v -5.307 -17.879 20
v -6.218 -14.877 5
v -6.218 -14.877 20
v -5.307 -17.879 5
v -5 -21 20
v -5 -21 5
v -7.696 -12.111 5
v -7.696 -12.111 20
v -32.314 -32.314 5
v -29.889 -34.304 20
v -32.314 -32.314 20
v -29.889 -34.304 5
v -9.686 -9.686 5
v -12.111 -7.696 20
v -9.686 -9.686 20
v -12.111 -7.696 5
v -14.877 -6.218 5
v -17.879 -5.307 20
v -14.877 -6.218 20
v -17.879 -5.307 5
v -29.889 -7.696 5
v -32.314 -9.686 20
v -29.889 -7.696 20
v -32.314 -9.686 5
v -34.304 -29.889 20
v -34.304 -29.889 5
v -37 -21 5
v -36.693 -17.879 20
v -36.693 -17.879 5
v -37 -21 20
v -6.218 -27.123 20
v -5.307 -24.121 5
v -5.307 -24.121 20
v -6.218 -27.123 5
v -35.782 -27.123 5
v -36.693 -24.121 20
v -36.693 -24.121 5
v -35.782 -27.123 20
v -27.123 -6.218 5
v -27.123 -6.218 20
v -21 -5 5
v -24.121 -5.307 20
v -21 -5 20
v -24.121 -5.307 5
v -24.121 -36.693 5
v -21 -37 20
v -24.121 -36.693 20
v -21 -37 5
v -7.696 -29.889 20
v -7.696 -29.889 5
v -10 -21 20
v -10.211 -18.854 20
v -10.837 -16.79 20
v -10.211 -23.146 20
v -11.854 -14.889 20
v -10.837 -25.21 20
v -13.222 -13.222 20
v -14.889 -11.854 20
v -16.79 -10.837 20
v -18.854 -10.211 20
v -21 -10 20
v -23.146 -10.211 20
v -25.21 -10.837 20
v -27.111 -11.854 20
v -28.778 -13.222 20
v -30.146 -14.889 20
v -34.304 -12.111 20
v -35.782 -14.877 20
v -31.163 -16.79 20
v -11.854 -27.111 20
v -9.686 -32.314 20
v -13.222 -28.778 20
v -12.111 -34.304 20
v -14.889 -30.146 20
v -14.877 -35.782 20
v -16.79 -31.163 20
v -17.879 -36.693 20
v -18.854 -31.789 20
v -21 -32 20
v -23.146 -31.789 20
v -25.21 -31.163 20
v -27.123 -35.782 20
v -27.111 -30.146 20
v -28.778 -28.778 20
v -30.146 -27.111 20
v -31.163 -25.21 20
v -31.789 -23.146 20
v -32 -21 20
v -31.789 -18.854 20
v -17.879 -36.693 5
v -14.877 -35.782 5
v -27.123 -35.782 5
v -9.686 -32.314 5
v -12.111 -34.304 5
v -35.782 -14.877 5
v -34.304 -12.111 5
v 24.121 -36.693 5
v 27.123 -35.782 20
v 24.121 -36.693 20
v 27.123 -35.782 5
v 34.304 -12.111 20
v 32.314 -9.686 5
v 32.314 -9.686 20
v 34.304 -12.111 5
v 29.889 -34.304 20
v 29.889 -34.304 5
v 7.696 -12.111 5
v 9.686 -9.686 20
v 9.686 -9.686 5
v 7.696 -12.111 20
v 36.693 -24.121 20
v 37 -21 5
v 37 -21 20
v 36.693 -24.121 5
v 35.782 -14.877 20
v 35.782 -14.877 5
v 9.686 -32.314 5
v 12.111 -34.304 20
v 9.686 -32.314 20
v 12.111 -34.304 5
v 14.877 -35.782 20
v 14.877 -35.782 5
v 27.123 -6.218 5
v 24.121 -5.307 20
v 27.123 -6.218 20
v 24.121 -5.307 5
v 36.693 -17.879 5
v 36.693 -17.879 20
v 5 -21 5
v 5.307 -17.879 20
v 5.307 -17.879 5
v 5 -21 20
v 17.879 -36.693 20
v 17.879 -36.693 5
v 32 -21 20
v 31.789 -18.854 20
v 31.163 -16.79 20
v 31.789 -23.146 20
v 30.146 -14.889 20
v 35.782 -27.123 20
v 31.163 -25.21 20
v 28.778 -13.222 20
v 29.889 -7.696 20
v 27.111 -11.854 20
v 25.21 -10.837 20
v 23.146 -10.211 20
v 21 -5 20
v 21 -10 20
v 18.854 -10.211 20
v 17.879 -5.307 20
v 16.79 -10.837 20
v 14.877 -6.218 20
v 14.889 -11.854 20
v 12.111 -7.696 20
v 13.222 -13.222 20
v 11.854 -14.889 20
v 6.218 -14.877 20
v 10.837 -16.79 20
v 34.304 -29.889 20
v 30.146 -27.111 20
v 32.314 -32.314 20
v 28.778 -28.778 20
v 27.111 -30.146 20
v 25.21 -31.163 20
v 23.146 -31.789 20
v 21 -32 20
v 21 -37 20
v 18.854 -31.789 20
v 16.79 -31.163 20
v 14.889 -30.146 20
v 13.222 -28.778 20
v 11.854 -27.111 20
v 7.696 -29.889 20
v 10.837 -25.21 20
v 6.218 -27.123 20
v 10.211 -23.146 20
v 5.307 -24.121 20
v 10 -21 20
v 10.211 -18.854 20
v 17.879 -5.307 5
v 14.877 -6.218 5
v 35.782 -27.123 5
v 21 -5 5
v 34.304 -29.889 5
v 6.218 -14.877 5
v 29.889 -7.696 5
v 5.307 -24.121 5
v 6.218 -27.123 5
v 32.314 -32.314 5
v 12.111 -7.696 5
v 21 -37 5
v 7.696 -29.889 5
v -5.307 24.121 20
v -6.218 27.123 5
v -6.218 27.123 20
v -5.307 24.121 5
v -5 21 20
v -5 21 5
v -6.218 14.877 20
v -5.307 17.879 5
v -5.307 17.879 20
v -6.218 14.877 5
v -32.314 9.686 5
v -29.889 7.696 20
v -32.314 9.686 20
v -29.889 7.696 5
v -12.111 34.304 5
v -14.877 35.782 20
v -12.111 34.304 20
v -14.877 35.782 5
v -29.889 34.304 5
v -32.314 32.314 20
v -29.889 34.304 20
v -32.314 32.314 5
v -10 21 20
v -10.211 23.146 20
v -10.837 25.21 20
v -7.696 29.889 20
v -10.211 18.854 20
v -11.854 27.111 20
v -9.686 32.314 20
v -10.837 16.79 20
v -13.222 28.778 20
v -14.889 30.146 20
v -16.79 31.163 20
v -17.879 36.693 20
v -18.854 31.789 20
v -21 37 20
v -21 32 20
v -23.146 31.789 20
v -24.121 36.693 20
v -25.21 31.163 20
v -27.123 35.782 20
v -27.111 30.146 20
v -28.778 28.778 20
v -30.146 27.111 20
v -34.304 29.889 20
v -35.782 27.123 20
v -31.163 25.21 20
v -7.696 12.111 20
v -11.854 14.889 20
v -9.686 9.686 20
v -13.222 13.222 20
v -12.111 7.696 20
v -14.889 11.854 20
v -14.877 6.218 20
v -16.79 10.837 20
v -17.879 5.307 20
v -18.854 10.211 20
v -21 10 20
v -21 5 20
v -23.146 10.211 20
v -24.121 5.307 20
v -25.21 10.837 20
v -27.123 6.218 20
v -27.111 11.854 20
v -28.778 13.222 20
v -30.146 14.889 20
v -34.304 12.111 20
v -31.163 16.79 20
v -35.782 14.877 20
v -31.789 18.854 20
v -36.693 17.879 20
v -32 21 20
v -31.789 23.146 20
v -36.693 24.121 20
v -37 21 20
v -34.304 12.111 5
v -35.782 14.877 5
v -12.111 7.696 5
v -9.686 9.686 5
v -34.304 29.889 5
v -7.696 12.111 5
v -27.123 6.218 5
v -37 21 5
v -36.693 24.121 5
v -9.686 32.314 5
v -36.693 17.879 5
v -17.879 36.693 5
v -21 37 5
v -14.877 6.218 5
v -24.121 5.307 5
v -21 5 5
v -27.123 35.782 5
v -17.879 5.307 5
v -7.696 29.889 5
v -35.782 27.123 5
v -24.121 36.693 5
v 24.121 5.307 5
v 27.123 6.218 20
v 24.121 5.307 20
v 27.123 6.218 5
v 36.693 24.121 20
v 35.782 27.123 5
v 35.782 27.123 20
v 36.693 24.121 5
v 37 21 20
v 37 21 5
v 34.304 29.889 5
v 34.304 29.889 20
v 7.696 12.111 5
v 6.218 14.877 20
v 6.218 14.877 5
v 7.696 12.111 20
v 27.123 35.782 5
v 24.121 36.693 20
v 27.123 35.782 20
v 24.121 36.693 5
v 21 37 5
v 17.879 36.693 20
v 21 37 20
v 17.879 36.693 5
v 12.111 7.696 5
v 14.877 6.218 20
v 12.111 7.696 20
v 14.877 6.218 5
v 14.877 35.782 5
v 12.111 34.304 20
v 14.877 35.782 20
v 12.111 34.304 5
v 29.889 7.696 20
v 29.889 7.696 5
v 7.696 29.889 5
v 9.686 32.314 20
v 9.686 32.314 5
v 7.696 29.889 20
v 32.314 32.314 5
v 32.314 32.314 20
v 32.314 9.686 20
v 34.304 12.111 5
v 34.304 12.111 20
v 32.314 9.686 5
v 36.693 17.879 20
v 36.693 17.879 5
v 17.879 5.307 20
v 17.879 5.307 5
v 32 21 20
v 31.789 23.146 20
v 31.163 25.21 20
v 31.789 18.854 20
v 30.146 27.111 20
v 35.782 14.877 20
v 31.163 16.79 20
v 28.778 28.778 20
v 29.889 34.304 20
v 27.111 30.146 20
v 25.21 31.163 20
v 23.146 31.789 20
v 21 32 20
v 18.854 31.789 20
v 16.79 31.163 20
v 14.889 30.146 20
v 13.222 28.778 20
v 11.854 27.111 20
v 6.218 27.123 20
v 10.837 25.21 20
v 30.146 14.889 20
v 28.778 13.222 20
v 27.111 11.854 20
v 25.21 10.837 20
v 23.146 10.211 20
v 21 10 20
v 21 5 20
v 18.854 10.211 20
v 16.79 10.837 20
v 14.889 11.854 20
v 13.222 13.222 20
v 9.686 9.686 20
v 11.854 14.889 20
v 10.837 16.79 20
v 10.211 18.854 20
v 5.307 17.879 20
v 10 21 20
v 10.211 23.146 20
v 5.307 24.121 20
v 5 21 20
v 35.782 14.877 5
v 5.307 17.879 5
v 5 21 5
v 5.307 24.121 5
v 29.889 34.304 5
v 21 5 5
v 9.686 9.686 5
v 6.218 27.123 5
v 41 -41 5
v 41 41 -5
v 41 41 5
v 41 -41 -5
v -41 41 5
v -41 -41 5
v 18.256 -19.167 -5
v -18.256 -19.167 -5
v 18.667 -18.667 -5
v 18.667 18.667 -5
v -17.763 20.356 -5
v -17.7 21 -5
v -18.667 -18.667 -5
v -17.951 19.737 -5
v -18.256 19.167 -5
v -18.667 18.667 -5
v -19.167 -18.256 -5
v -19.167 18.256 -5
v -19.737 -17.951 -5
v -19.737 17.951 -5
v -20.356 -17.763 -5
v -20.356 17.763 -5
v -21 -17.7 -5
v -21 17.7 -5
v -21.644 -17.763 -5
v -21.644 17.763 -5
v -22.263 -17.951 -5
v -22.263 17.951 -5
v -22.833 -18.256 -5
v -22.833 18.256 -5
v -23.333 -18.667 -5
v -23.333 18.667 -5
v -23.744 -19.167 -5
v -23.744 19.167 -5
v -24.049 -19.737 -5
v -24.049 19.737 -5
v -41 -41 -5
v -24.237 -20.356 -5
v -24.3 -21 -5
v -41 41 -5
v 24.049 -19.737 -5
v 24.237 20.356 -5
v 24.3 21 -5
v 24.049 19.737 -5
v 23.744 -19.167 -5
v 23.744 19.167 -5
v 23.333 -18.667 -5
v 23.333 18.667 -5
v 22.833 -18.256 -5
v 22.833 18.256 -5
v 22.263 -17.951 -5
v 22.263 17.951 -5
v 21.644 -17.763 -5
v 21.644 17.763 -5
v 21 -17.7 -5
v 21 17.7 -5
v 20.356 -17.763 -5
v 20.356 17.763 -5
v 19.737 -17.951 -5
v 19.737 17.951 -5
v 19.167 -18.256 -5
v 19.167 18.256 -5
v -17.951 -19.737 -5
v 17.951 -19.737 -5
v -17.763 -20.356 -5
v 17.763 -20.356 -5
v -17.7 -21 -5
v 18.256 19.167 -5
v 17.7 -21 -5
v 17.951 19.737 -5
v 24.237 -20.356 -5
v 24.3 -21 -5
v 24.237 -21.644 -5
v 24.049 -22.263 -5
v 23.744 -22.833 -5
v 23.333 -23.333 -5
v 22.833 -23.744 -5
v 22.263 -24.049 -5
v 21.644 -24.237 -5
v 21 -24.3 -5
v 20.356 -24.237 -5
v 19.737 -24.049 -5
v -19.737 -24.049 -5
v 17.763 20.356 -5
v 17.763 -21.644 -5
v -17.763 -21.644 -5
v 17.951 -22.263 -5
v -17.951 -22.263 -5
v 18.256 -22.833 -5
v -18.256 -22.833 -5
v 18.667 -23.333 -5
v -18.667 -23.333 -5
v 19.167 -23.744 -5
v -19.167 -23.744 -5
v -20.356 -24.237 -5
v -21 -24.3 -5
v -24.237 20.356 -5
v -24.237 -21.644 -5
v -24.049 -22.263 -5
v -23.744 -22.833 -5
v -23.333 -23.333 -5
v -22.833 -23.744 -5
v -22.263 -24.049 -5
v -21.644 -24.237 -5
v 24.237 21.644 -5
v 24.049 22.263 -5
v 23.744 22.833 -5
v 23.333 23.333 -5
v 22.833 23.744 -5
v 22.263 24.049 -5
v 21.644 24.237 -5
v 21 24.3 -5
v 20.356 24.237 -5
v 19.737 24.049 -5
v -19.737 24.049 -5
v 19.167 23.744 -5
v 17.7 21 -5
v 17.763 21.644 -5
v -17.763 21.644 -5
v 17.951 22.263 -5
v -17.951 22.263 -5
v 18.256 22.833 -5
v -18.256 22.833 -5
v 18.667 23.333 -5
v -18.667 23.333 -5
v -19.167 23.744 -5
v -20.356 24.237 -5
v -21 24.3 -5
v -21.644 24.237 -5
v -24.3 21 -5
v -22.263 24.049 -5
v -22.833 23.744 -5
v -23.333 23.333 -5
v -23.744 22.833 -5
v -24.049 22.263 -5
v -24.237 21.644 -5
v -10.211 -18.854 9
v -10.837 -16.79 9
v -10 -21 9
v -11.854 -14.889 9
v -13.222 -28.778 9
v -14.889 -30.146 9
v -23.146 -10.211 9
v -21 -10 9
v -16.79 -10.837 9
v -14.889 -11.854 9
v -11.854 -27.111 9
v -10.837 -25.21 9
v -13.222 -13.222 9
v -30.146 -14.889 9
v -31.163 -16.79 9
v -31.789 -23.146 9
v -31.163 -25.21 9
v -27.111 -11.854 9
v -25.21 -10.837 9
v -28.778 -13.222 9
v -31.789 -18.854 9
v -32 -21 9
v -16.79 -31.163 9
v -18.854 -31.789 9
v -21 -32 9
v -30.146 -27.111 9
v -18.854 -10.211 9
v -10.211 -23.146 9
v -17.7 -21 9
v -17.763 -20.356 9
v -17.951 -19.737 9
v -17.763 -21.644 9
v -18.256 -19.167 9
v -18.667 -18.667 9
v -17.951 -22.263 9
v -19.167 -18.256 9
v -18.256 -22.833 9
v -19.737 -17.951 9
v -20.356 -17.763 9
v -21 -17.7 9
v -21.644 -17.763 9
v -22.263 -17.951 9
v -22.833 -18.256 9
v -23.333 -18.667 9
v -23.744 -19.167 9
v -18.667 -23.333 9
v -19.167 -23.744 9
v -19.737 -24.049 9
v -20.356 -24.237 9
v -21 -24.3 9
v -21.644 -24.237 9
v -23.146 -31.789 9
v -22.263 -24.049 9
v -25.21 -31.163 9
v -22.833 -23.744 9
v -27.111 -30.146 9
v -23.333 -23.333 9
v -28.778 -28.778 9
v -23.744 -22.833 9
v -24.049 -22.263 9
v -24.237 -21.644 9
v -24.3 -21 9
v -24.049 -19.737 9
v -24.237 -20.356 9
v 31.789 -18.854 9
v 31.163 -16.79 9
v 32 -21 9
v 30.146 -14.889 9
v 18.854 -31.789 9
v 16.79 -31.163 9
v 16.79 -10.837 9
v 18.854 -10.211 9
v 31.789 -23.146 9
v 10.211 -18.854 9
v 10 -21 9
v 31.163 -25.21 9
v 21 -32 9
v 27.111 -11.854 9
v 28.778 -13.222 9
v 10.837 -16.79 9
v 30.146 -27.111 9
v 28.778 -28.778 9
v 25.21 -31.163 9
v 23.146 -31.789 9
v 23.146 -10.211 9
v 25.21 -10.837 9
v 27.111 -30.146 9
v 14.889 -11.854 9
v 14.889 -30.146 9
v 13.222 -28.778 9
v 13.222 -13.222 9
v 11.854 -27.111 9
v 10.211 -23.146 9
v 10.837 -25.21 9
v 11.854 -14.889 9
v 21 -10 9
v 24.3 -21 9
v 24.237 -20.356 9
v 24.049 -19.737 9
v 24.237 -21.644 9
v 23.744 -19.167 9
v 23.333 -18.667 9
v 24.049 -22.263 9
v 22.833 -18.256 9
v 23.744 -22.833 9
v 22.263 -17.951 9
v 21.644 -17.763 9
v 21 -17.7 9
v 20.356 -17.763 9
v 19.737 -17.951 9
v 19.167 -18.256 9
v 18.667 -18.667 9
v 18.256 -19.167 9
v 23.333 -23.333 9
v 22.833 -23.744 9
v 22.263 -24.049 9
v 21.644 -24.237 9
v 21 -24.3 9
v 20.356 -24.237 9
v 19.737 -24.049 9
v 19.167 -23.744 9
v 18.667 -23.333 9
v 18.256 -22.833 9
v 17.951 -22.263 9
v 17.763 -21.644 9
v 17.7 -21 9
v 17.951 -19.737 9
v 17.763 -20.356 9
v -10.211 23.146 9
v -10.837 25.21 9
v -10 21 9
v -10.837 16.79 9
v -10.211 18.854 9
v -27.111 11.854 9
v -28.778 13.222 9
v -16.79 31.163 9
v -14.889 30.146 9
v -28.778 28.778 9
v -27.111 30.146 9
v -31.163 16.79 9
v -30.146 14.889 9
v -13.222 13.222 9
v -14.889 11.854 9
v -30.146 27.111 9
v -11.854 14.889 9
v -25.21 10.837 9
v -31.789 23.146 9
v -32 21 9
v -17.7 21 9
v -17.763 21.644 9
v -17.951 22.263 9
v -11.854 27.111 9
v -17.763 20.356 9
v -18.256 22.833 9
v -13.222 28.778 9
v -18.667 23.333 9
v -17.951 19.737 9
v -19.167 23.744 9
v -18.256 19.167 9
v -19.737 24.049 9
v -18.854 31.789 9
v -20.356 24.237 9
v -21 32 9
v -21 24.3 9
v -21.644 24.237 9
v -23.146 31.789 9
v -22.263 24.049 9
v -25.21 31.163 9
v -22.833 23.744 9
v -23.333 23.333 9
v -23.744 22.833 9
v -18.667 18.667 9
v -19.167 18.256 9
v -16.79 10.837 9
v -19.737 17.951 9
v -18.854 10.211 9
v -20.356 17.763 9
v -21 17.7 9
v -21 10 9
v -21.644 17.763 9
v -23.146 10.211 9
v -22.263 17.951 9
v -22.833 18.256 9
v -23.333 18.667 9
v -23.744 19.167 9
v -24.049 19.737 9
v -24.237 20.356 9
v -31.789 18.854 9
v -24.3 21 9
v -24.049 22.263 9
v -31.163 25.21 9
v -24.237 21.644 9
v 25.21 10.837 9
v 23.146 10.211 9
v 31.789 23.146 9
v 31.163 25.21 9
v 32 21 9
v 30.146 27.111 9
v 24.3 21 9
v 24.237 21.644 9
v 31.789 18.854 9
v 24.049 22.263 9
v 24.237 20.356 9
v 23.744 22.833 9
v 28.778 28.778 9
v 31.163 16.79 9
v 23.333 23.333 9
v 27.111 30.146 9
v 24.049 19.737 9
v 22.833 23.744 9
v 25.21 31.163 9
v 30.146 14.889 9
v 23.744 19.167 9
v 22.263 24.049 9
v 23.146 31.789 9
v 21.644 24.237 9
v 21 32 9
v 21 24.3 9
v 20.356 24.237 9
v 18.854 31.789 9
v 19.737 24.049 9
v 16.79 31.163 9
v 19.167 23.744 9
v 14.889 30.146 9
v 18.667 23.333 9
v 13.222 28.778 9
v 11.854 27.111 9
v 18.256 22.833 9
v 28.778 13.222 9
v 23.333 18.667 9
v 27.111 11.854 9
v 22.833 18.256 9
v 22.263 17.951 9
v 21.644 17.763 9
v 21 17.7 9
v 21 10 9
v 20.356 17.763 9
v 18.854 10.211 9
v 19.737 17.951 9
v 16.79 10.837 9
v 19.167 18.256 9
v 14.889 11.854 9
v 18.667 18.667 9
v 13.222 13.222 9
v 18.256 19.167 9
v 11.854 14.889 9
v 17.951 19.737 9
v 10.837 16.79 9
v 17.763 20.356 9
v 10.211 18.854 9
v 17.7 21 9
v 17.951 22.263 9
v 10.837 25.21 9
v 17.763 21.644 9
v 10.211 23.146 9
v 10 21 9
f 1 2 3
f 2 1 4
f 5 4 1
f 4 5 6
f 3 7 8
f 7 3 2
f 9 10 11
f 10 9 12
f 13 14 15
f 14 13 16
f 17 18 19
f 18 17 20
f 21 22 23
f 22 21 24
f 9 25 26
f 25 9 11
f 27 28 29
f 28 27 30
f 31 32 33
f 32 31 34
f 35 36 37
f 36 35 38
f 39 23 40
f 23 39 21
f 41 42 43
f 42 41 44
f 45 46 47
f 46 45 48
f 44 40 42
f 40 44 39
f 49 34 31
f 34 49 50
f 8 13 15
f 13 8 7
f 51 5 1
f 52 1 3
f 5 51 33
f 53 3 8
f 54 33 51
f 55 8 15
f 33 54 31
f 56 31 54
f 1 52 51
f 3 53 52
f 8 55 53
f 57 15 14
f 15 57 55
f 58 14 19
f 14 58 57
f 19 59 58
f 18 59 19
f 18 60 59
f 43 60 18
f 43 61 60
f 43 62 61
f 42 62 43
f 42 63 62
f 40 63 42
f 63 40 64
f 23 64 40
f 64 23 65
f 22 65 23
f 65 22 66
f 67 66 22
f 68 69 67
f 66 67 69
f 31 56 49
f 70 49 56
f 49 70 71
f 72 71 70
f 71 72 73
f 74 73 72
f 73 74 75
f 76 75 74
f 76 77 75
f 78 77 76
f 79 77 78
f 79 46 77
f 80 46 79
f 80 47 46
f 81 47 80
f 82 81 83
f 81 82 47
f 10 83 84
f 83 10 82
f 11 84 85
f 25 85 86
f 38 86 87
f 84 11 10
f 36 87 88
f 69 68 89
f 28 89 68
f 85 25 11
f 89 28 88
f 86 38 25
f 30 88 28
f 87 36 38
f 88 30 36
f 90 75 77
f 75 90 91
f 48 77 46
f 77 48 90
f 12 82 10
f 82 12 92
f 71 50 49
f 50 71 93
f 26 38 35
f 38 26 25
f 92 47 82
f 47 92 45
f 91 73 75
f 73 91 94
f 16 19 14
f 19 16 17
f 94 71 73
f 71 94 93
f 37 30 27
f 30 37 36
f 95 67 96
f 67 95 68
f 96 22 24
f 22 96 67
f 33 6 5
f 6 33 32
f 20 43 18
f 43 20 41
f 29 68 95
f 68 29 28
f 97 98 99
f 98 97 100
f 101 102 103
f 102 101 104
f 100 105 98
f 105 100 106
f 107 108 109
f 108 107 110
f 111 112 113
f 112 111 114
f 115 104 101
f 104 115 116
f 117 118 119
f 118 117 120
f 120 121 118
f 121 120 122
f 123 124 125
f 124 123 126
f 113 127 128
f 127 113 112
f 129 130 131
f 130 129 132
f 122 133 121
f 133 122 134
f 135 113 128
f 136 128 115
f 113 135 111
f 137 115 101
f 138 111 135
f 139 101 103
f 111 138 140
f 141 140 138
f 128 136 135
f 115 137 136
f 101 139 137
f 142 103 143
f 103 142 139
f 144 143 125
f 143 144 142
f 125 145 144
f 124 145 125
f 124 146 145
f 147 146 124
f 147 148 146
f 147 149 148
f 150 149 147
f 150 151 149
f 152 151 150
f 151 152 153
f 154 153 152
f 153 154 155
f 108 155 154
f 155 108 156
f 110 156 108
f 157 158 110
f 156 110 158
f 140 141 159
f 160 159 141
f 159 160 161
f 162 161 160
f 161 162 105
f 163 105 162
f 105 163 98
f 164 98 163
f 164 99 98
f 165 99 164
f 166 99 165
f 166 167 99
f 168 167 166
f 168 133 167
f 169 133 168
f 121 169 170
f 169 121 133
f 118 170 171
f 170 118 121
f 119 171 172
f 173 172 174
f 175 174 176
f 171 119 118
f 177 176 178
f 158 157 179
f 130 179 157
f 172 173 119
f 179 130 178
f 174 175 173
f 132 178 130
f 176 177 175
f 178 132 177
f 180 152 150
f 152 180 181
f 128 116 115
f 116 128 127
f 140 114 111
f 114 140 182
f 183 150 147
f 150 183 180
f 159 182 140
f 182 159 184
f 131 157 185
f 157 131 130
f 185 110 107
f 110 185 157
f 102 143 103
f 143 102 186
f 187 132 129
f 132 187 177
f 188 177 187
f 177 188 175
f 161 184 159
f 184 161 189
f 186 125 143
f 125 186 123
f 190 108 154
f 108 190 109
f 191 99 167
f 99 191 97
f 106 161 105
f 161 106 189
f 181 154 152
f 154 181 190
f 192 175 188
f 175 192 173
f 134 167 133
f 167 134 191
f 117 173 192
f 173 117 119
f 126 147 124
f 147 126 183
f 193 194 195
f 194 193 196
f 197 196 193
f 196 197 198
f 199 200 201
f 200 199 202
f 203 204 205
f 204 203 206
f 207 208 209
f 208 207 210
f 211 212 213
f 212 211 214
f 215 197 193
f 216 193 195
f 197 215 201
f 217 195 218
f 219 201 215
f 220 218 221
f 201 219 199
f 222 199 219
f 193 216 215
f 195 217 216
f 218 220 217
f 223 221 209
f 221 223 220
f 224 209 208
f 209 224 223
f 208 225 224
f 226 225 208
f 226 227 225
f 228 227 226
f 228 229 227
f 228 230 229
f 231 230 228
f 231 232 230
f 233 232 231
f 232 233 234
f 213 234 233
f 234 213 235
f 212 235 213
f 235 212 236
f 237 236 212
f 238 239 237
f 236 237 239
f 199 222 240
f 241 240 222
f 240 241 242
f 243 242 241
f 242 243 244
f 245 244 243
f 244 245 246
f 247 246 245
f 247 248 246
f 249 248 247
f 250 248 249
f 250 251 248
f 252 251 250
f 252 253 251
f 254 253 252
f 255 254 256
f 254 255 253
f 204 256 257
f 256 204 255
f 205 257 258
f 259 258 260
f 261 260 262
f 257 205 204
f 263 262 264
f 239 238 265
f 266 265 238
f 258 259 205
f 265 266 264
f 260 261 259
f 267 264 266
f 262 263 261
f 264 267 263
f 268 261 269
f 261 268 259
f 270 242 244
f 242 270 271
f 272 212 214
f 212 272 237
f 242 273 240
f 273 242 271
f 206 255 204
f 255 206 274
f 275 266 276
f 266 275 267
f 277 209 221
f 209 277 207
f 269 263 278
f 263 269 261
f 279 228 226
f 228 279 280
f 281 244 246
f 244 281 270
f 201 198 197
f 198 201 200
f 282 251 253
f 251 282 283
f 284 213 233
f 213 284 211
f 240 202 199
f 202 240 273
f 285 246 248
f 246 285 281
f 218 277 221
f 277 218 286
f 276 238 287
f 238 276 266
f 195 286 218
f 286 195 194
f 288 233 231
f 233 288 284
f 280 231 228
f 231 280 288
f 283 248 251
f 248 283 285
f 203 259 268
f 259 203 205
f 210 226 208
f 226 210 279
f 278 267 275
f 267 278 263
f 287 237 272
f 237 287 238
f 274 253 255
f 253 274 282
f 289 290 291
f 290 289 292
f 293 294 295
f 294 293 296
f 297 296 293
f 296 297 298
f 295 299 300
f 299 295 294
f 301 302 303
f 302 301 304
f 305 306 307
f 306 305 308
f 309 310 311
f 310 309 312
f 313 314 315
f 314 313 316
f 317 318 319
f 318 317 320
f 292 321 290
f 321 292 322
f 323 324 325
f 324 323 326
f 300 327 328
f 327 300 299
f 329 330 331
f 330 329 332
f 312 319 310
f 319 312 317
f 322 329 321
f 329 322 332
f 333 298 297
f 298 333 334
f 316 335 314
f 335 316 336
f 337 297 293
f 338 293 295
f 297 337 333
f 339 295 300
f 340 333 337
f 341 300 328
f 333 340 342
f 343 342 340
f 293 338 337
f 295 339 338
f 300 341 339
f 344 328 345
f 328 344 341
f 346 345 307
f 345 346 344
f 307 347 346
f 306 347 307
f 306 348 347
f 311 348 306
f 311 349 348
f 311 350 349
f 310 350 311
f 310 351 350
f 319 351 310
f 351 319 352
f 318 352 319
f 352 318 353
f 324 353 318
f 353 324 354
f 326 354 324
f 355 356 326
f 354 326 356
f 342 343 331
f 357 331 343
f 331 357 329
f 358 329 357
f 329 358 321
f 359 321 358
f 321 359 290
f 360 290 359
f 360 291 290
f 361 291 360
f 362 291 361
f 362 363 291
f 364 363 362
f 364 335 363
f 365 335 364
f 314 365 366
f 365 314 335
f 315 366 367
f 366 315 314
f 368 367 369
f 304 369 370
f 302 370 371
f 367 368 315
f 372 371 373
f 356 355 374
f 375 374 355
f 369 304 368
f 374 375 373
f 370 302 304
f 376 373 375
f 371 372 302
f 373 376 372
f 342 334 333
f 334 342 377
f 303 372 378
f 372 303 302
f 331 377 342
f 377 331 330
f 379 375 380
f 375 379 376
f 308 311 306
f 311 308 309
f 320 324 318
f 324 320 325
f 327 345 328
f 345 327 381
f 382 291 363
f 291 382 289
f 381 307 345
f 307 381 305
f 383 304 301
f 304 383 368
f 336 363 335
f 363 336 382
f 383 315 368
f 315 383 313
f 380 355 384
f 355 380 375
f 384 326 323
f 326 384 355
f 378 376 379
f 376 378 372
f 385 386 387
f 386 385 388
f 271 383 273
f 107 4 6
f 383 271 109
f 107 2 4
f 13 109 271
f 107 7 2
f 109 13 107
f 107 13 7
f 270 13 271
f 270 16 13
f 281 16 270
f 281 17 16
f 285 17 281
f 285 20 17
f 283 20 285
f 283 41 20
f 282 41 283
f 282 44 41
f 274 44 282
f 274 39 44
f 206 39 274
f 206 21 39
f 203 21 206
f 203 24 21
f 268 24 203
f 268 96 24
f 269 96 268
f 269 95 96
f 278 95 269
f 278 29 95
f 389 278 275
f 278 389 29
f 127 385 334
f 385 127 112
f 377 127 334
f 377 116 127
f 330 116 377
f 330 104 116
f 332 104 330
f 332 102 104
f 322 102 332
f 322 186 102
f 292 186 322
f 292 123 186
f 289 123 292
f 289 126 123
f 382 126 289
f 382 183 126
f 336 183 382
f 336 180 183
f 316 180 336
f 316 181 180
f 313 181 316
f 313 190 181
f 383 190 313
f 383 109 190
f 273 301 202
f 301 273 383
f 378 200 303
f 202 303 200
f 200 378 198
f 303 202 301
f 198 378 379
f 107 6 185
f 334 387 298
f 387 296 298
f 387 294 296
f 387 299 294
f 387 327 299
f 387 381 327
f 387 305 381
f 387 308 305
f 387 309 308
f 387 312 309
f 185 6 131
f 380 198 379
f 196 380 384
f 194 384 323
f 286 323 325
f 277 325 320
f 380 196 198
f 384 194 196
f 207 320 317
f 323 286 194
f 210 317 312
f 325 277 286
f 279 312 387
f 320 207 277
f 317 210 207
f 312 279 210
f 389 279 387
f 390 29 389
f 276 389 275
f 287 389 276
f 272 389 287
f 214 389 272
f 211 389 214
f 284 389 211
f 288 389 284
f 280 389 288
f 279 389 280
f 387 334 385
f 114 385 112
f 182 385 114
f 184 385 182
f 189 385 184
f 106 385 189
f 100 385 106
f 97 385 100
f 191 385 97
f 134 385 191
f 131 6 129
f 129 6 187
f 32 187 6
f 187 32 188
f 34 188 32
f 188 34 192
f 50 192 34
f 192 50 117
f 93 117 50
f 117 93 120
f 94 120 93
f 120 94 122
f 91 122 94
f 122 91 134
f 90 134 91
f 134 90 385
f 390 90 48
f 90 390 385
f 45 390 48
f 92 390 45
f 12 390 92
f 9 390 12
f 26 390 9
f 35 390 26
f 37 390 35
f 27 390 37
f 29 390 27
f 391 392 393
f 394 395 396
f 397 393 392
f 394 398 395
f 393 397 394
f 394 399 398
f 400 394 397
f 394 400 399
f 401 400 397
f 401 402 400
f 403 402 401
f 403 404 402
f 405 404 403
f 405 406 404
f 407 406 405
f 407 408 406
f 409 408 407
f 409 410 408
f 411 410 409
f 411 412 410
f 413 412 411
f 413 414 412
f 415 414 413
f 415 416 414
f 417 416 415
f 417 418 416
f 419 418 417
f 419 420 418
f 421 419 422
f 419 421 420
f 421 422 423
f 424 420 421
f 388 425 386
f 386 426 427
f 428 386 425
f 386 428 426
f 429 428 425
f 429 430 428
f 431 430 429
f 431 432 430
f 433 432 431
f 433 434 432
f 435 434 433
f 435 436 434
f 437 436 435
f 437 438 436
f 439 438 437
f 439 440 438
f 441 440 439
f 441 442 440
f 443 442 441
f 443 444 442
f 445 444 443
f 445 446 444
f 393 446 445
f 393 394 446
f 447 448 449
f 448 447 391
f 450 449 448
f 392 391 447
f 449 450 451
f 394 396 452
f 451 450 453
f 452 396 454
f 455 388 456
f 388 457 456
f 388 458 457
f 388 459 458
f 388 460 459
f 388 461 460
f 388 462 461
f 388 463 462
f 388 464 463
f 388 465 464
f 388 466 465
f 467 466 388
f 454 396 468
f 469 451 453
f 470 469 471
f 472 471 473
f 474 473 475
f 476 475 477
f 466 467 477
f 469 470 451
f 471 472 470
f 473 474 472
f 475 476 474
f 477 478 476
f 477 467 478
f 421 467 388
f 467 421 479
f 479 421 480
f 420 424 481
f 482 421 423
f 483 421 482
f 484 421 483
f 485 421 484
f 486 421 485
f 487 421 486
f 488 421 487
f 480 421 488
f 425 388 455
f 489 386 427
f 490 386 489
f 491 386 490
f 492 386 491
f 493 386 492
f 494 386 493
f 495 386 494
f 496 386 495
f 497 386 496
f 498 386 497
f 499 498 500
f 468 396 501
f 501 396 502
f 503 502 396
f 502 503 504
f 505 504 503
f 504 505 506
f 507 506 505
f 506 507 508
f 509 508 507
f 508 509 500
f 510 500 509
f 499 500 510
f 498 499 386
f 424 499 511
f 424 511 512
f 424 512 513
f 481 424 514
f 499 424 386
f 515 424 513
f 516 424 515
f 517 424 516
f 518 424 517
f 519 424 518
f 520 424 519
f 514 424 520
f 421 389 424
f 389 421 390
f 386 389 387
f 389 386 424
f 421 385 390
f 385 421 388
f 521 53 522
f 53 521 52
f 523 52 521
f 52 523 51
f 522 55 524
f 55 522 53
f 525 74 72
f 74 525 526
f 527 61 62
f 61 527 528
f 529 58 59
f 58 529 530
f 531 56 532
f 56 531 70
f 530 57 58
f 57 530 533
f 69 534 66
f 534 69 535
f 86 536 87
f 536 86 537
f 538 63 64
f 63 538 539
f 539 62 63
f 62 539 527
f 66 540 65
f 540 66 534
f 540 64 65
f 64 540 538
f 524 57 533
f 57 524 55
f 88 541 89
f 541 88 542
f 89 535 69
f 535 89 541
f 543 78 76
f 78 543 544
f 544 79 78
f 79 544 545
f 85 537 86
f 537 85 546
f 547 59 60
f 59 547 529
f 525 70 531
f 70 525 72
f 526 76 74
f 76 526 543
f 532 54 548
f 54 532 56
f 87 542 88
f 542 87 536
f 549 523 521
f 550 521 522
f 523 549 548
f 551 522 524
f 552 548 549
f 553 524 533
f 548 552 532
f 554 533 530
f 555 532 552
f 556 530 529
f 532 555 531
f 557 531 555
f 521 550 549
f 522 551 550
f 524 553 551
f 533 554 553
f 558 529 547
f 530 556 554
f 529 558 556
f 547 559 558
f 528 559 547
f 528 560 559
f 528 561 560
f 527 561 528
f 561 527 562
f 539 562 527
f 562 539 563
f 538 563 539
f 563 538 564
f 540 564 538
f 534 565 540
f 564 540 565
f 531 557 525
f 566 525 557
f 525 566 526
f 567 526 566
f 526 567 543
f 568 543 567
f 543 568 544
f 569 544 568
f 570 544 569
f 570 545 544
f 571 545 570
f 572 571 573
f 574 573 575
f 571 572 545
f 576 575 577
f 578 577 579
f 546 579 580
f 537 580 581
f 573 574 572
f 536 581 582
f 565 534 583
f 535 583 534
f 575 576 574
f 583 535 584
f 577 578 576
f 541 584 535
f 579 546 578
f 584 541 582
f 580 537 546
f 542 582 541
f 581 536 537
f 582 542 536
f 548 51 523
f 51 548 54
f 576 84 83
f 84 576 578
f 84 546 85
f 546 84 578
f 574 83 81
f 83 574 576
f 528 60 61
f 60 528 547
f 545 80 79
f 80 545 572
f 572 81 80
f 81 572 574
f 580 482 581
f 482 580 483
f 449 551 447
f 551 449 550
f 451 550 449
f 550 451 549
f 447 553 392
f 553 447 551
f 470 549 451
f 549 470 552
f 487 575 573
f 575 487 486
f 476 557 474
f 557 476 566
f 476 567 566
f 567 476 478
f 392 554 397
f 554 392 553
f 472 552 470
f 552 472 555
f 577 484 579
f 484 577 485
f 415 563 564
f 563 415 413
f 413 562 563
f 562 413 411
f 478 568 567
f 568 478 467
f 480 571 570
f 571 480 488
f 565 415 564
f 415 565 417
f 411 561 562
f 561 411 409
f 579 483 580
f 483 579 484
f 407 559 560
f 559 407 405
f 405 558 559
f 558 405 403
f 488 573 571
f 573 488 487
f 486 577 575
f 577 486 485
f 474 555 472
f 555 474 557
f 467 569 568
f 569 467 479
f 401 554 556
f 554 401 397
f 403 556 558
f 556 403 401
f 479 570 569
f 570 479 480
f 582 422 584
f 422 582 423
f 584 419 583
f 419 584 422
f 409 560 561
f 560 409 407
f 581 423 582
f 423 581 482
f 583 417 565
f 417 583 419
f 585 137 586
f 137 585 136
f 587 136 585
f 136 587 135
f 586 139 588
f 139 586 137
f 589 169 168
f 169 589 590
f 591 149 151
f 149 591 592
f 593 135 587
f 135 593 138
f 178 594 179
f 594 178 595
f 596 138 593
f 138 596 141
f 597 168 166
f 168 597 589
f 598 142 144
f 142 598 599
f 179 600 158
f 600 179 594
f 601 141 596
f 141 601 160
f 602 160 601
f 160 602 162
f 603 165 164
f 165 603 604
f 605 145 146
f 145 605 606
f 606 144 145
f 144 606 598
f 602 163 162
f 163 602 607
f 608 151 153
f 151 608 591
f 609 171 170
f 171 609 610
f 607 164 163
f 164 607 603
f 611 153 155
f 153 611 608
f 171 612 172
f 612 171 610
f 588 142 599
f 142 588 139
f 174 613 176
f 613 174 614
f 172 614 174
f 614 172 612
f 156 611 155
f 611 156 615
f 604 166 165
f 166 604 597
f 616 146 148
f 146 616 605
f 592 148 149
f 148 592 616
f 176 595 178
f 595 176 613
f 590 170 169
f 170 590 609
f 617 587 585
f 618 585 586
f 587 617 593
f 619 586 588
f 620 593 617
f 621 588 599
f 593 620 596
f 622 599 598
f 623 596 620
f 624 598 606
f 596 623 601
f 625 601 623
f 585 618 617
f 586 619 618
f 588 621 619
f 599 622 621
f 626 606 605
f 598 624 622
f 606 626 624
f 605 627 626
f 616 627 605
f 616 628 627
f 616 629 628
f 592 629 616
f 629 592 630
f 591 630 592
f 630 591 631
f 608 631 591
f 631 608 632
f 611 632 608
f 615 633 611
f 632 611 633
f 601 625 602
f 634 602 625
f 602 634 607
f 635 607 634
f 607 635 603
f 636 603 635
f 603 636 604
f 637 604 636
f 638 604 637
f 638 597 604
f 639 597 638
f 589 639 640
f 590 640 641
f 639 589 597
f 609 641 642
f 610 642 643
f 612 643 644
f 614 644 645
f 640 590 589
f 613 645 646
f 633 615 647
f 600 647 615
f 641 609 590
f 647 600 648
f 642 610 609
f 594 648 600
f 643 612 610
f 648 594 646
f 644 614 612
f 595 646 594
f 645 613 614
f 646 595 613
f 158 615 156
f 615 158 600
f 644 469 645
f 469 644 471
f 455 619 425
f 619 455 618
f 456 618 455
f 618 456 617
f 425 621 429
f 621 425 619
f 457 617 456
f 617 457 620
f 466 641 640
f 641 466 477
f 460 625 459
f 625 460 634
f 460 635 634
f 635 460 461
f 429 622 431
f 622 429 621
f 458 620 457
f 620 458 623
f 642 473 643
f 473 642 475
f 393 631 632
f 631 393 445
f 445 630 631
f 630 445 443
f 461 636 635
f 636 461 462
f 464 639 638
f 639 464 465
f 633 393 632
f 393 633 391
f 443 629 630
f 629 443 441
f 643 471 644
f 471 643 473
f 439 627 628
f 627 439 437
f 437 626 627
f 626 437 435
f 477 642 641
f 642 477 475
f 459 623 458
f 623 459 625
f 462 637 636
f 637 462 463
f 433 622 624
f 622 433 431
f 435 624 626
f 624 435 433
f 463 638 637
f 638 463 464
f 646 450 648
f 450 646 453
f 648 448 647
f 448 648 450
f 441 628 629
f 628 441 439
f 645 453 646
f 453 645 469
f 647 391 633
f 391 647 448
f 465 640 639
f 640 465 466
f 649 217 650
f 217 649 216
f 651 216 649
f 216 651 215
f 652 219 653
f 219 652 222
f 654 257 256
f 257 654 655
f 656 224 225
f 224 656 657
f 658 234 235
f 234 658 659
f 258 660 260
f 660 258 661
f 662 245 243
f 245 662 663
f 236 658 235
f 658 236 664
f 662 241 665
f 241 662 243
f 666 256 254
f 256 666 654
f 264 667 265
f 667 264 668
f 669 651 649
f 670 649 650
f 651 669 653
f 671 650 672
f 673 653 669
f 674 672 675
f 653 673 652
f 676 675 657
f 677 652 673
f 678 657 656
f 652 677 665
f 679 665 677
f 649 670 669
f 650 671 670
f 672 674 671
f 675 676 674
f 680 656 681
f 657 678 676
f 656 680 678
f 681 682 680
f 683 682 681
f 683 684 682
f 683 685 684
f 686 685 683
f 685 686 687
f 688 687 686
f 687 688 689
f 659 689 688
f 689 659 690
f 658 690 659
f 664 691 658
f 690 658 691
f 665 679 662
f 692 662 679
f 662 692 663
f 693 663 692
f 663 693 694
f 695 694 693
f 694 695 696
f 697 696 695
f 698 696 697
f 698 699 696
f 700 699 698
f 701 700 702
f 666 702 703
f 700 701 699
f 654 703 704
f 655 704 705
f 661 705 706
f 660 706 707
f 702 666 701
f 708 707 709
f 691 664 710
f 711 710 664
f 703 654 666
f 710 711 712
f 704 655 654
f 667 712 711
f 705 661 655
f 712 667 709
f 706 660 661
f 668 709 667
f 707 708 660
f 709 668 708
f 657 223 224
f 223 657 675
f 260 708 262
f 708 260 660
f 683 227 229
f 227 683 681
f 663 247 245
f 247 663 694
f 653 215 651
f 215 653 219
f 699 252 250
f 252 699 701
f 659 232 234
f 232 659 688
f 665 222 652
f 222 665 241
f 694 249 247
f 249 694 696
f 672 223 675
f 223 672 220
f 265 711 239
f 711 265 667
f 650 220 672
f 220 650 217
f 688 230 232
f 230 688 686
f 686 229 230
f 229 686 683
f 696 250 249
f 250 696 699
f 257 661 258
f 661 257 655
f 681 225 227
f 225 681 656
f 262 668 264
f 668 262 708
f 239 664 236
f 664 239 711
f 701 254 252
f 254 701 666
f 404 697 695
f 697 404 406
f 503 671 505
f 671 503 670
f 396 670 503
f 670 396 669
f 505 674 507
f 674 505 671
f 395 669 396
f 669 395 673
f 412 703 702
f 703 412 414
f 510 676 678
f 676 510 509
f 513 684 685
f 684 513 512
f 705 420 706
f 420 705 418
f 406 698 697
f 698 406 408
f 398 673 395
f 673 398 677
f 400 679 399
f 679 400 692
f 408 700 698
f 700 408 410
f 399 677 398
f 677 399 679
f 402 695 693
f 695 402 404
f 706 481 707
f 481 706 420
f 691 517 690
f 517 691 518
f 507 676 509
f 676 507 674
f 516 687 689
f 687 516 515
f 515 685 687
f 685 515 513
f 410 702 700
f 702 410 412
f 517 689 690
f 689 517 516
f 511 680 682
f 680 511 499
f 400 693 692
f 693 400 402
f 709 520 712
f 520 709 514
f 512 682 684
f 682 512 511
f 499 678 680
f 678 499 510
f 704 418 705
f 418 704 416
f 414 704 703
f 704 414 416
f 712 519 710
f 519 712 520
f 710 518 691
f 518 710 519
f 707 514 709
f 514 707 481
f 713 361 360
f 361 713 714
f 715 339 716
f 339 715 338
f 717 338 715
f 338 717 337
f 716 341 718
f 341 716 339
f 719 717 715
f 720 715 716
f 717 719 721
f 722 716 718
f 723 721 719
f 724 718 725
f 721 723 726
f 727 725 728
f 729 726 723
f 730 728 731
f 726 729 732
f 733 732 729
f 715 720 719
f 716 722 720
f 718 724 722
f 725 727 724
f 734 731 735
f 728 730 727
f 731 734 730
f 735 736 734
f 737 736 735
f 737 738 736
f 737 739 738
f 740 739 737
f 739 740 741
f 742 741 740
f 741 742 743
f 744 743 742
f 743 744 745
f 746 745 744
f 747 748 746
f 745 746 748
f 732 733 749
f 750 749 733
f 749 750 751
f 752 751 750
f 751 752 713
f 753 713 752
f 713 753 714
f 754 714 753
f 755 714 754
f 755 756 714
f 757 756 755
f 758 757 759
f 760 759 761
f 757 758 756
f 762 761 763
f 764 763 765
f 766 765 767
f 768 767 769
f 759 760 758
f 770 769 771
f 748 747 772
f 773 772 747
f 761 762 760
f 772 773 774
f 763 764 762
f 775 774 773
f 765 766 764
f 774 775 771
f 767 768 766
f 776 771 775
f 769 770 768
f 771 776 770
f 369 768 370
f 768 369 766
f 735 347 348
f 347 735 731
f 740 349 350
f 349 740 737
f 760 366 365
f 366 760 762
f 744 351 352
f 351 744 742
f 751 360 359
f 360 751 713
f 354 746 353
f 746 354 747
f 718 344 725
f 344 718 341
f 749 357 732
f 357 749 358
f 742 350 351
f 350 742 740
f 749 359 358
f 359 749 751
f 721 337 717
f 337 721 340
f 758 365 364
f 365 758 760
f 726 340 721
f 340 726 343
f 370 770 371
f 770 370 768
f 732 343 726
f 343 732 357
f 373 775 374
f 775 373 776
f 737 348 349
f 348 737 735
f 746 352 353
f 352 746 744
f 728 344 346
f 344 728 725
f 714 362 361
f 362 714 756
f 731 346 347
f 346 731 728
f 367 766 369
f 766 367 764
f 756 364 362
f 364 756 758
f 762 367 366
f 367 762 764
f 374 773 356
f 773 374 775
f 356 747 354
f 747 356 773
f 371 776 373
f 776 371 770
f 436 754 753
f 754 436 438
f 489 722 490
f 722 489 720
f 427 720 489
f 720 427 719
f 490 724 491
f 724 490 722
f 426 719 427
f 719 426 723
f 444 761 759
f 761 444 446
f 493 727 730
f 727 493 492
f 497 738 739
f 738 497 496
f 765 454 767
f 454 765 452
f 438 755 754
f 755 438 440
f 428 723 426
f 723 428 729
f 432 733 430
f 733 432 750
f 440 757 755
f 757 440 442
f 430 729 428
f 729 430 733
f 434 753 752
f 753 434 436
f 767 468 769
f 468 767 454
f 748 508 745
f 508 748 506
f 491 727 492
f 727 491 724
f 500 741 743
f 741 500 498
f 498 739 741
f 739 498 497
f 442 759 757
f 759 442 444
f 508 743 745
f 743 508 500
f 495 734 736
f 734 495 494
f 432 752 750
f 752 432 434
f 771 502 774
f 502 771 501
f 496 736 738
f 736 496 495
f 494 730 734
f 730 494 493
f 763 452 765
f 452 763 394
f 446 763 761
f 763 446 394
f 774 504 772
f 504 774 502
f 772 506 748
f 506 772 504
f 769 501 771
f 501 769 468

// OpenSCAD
$fn = 32;

// ----------------------------------------------------------------------
// Socket pad plate
// bosses with counterbored sockets for the screws
// ----------------------------------------------------------------------

// --- parameters (mm) ---
base_t = 10;        // base plate thickness
boss_h = 15;        // boss height above the base plate
boss_d = 32;        // boss diameter
socket_d = 22;      // socket diameter
socket_depth = 11;  // socket depth from the boss face
bolt_d = 6.6;       // screw clearance hole through the socket floor
rows = 2;           // boss rows
cols = 2;           // bosses per row
pitch = 42;         // boss pitch

// --- derived feature positions (mm) ---
height = base_t + boss_h;           // = 25   overall height of the part
plate = [pitch * (cols - 1) + boss_d + 8, pitch * (rows - 1) + boss_d + 8, base_t];  // = [82, 82, 10]   overall size (x, y, z)
span_x = pitch * (cols - 1);        // = 42   distance between outer bosses
span_y = pitch * (rows - 1);        // = 42   distance between boss rows
origin_x = -span_x / 2;             // = -21   X of the first boss
origin_y = -span_y / 2;             // = -21   Y of the first boss
feature_centers = [
  [origin_x + 0 * pitch, origin_y + 0 * pitch],
  [origin_x + 1 * pitch, origin_y + 0 * pitch],
  [origin_x + 0 * pitch, origin_y + 1 * pitch],
  [origin_x + 1 * pitch, origin_y + 1 * pitch]
];   // boss centres: sockets, holes and the pads themselves are placed from here

// base plate, bosses on feature_centers, socket + through hole in each
difference() {
  union() {
    cube(plate, center = true);
    for (centre = feature_centers)
      translate([centre[0], centre[1], plate[2] / 2 - 1])
        cylinder(d = boss_d, h = boss_h + 1);
  }
  for (centre = feature_centers) {
    translate([centre[0], centre[1], plate[2] / 2 + boss_h - socket_depth])
      cylinder(d = socket_d, h = socket_depth + 1);
    translate([centre[0], centre[1], -height])
      cylinder(d = bolt_d, h = 2 * height + 2);  // through the socket floor
  }
}
